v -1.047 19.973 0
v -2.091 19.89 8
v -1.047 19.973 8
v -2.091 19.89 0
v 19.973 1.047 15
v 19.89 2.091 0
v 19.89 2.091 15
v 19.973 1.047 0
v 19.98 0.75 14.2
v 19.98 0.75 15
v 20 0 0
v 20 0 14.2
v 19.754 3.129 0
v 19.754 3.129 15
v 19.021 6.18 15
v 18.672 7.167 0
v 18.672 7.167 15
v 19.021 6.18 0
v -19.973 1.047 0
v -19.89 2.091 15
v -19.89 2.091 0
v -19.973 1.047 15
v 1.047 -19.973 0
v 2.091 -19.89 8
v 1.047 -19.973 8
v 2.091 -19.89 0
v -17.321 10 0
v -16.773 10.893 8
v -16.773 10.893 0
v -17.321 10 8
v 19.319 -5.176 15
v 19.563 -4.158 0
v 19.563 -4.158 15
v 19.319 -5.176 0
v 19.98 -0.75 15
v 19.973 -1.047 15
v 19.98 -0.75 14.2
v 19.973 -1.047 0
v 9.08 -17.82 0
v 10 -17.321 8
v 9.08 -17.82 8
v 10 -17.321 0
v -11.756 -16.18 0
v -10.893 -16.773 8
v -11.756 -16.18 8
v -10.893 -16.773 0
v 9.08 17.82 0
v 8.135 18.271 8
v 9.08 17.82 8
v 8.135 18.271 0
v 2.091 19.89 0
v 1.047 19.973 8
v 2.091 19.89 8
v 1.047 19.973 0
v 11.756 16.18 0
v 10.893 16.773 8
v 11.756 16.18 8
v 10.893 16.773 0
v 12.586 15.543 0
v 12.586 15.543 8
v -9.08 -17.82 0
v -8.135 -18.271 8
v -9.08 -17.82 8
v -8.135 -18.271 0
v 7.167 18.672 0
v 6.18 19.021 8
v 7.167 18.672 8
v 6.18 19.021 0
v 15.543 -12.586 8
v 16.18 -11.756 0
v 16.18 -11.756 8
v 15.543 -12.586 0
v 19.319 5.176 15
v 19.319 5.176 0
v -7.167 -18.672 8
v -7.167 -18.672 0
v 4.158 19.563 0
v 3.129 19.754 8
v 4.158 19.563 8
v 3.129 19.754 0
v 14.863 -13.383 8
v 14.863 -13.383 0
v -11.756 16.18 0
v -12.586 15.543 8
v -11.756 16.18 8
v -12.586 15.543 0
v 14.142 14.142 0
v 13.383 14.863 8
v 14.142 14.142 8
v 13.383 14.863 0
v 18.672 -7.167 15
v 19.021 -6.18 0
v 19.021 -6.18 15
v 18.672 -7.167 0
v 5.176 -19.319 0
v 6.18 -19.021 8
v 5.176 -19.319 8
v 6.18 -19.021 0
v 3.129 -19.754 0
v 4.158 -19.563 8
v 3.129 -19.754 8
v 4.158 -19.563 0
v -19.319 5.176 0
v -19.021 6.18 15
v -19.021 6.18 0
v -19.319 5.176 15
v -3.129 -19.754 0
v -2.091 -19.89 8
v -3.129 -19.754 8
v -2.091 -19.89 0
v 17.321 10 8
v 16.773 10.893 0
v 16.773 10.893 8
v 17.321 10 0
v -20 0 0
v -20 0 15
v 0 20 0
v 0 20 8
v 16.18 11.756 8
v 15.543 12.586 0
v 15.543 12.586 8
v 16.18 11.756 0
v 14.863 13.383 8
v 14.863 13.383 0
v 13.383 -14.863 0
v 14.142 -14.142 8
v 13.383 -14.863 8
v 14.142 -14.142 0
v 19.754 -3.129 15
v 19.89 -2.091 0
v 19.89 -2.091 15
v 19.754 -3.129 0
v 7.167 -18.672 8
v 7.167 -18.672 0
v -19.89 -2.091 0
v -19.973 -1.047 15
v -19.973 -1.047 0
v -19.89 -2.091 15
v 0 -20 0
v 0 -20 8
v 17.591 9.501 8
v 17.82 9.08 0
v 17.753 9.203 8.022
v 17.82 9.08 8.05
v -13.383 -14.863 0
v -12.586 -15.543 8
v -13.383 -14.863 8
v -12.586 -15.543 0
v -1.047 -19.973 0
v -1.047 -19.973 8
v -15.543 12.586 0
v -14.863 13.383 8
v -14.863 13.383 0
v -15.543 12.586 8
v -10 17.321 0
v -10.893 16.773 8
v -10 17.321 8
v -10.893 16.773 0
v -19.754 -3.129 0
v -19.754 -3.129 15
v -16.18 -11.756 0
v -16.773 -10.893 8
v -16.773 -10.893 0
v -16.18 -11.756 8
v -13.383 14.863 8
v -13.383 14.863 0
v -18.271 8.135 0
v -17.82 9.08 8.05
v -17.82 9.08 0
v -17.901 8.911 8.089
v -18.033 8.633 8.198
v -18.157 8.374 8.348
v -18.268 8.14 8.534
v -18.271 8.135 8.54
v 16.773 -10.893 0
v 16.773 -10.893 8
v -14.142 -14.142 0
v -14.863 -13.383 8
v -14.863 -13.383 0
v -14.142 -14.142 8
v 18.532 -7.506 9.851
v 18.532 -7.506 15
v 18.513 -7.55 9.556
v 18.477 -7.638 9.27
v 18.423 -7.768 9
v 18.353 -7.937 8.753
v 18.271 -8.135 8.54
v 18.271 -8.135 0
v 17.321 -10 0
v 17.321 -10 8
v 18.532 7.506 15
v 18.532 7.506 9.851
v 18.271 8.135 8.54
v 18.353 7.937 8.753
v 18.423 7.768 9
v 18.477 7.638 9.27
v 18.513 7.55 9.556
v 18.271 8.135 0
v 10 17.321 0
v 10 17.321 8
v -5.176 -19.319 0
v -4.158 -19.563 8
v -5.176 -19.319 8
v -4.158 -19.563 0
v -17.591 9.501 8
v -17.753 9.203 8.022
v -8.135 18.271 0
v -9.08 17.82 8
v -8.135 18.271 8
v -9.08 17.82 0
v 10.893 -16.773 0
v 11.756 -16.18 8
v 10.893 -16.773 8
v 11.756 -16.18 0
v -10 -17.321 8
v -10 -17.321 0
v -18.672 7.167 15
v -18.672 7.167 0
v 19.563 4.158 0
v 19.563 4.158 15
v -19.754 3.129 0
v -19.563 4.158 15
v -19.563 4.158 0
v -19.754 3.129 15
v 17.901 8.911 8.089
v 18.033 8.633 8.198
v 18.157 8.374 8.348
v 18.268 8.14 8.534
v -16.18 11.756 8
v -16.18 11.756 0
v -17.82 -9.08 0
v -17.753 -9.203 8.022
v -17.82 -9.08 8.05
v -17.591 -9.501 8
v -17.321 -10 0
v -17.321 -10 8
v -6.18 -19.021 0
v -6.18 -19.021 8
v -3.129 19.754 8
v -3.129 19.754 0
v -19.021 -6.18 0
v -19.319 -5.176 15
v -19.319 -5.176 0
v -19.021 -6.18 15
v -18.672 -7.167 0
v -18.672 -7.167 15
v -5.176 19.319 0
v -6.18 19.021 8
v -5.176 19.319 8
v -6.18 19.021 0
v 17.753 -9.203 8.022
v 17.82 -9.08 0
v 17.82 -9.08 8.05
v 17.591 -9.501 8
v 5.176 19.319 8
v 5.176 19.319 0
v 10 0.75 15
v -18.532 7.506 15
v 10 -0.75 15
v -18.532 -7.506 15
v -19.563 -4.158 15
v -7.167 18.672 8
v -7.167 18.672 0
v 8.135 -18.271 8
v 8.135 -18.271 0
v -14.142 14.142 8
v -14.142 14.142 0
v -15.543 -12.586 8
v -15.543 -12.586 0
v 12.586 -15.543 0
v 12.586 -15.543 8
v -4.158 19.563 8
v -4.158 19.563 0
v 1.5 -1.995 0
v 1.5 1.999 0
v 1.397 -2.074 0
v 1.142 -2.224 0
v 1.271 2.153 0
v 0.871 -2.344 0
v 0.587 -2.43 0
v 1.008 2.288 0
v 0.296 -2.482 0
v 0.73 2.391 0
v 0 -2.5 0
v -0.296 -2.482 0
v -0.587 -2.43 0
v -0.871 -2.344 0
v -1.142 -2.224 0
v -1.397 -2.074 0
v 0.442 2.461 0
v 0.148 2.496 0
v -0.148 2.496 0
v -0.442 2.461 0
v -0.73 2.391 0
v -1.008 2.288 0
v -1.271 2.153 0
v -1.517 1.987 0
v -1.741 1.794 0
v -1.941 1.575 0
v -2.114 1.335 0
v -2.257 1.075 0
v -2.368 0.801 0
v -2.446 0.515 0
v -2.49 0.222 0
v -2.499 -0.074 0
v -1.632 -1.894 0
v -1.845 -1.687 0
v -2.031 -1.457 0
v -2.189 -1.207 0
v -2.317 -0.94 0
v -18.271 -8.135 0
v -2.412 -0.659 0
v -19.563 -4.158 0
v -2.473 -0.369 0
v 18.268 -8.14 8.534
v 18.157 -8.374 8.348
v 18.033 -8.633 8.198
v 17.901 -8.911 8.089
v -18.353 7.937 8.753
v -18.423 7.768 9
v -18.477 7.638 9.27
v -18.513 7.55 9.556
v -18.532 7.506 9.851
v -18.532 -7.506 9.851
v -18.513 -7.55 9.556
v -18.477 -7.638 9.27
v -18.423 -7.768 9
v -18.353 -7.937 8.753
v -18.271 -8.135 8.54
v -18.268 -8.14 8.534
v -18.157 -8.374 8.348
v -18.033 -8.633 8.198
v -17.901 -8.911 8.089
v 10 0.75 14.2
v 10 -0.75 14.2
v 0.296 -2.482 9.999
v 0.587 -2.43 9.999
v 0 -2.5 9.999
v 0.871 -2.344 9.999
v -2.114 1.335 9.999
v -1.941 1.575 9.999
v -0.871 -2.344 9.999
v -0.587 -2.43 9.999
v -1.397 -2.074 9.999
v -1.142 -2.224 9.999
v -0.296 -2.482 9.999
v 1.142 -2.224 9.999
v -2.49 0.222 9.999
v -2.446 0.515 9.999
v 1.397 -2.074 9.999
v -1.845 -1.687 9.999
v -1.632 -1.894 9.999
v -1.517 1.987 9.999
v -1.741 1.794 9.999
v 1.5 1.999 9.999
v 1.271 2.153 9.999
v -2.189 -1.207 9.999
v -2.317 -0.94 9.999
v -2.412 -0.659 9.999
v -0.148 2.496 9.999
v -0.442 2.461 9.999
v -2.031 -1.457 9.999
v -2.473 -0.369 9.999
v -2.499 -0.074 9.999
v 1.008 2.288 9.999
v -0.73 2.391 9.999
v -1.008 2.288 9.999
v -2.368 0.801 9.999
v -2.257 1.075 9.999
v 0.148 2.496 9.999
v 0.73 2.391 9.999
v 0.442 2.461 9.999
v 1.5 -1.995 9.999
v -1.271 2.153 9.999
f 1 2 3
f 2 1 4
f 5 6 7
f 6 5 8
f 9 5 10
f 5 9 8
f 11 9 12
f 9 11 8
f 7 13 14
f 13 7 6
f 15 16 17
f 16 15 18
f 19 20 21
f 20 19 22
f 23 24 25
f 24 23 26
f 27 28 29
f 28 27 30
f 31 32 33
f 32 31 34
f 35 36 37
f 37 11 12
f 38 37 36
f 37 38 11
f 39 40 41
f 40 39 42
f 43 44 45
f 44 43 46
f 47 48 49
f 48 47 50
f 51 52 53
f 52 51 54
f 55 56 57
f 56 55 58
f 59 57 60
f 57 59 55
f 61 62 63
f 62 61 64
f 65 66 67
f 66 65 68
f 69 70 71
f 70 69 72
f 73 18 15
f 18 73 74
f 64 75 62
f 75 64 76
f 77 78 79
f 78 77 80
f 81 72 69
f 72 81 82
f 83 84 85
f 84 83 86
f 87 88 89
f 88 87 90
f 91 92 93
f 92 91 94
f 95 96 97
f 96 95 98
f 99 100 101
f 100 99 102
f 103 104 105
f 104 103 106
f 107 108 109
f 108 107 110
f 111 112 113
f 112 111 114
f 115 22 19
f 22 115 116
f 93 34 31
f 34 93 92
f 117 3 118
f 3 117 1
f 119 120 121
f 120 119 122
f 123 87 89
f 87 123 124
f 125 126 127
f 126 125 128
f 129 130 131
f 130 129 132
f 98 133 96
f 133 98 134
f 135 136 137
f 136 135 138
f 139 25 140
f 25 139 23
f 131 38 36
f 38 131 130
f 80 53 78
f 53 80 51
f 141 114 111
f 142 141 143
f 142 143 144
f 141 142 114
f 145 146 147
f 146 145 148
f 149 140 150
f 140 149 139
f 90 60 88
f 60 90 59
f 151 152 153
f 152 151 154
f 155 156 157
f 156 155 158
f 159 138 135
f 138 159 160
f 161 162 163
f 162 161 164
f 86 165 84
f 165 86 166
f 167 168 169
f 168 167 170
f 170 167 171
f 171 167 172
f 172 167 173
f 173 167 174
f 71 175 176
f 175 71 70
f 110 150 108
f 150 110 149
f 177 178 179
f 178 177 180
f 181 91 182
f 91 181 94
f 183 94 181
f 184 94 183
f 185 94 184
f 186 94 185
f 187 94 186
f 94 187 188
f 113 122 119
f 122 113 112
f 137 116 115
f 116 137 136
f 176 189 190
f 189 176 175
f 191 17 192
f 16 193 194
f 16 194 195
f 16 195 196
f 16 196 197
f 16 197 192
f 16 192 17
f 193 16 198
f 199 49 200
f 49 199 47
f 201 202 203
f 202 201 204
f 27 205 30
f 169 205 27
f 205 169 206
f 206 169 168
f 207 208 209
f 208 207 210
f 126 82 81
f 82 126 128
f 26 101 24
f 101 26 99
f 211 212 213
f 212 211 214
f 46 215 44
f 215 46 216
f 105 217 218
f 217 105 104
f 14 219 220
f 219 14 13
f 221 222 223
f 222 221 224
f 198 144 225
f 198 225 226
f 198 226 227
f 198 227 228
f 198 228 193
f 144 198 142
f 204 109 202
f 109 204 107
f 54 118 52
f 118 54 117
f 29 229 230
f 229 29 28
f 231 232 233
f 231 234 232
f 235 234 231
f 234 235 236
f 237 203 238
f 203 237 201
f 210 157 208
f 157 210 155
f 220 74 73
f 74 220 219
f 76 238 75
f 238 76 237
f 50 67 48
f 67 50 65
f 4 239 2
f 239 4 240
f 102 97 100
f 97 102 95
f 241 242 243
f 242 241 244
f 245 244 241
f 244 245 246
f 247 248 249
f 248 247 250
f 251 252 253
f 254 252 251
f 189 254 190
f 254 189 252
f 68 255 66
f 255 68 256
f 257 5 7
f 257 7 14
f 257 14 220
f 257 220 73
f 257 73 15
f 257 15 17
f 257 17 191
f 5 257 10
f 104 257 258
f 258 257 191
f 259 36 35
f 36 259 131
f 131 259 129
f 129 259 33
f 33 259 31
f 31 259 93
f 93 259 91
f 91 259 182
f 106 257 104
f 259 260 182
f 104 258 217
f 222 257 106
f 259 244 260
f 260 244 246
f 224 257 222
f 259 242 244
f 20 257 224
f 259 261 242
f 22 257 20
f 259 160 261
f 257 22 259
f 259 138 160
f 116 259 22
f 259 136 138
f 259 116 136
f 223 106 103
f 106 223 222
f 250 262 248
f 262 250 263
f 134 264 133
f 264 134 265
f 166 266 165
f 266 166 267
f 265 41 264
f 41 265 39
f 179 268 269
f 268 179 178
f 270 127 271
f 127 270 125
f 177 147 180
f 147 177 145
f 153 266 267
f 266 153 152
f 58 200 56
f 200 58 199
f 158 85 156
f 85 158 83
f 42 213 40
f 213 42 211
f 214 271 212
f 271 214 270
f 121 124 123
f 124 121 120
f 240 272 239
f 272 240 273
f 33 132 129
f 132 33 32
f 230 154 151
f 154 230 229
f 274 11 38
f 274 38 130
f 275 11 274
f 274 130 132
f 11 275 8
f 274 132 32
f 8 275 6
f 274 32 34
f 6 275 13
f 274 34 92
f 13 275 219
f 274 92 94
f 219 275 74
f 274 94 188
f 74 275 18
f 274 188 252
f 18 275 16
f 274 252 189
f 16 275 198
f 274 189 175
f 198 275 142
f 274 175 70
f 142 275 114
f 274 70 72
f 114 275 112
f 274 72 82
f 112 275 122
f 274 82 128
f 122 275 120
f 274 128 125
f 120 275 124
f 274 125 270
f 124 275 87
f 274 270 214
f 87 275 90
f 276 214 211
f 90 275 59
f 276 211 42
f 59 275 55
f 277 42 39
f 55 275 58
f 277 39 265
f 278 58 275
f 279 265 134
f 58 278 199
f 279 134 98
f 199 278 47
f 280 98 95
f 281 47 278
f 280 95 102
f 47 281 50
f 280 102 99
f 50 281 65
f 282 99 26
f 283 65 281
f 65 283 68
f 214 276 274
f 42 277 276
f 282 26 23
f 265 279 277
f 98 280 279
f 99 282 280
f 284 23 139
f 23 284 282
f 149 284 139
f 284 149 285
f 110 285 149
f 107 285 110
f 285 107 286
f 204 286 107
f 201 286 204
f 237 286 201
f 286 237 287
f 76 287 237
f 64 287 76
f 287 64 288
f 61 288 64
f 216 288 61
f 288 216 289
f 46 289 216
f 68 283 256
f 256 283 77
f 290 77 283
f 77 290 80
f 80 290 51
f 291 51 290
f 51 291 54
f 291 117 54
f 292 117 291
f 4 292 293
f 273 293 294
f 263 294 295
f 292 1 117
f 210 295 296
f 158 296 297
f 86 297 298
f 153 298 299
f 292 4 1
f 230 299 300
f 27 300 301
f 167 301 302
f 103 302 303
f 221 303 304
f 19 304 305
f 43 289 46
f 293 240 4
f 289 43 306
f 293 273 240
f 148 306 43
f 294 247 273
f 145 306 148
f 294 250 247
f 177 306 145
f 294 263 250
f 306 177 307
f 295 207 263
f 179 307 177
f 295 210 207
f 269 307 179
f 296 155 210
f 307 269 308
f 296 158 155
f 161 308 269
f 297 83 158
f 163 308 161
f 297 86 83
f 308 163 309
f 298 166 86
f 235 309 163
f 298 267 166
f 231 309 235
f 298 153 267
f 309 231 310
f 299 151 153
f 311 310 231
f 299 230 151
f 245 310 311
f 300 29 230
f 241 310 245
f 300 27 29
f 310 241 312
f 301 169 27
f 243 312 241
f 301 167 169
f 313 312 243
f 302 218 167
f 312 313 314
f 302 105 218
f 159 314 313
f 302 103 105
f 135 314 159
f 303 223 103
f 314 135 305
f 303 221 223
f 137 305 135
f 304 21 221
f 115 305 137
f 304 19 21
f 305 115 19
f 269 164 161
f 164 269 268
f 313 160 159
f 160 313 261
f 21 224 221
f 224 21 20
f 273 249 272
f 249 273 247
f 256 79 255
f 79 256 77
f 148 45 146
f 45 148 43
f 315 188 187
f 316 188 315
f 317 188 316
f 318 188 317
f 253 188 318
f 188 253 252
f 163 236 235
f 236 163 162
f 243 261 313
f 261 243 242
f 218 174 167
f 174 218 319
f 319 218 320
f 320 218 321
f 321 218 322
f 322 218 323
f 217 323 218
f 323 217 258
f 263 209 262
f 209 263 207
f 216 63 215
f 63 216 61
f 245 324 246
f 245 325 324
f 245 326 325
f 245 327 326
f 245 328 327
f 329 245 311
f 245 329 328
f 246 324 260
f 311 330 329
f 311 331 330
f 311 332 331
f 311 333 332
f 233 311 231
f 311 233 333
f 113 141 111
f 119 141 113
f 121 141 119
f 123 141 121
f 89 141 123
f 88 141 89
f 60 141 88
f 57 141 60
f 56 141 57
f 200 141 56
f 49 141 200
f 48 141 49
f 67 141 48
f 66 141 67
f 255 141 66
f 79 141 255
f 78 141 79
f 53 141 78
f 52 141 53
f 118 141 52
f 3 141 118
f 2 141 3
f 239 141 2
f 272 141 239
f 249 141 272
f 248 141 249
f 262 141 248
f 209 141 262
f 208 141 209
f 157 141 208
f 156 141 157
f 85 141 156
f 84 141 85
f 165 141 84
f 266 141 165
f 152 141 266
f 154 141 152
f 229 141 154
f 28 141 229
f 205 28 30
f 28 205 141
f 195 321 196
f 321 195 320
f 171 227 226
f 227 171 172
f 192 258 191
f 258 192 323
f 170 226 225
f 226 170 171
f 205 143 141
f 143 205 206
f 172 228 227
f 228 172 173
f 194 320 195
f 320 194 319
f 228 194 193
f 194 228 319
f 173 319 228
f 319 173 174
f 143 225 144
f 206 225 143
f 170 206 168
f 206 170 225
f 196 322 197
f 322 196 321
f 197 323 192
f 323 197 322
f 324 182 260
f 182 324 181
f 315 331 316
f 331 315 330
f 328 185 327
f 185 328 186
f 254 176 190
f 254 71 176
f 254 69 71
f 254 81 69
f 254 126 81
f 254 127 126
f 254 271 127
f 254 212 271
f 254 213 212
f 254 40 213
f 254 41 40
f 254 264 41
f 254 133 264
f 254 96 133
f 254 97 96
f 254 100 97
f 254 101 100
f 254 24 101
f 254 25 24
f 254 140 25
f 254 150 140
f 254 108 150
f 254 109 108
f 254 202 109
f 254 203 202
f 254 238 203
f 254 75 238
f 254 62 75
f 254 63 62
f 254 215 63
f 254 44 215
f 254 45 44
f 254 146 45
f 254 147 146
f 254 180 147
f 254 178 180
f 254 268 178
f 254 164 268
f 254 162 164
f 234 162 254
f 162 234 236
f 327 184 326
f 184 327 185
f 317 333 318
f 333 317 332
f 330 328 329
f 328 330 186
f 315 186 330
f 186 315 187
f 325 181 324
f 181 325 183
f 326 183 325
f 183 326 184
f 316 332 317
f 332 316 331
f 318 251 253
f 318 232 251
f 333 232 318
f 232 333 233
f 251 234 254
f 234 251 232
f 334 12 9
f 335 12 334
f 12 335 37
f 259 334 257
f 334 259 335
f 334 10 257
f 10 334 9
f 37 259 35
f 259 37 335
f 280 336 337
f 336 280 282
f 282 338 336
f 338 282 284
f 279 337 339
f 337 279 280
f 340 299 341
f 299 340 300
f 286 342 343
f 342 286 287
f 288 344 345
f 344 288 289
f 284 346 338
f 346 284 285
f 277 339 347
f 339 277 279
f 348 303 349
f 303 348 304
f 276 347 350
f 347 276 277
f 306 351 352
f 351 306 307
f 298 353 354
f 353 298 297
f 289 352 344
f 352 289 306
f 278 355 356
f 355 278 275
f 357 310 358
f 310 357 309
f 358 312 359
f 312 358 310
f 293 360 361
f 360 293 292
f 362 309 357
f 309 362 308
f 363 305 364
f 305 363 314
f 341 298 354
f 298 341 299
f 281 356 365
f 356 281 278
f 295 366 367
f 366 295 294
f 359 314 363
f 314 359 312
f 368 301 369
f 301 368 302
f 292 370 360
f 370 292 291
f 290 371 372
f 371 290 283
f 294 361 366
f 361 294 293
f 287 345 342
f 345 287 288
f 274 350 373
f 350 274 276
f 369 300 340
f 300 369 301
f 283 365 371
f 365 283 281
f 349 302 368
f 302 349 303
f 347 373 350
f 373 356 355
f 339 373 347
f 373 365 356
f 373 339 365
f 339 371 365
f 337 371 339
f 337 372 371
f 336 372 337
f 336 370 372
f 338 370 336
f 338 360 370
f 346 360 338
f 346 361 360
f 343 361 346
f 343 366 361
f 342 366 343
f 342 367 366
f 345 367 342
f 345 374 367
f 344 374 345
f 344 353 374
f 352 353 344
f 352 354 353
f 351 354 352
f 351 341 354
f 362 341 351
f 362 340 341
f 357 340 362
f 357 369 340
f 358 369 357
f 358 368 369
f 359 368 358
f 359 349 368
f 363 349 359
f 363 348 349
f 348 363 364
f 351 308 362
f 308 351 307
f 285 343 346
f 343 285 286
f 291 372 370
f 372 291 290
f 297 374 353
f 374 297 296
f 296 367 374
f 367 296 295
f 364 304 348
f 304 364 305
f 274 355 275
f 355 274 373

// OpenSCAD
/*
    OpenSCAD Script Name: D-shaft knob generator
    Author: Frantisek Nagy - hello@nagy.sh
    Date: 2025-02-23
    License: CC BY-NC-SA 4.0

    Copyright (c) 2025 Frantisek Nagy
*/

// https://makerworld.com/en/models/1142338-d-shaft-knob-generator

/* [Knob] */
Diameter=40;
Full_height=15;
Head_height=7;
Head_width=15;
Head_fillet=2;
/* [Marker line] */
Line_width=1.5;
Line_height=10;
Line_depth=0.8;
/* [Shaft] */
// Shaft Diameter ⌀
Shaft_Diameter = 5.0;
// Diameter (across cut) >D<
D_Shaft_Diameter = 4.0;
Shaft_depth=10;
Shaft_rotation=0; //[0:90:270]
/* [Bottom] */

Bottom_type="Full"; // [Full, Inner, Outer]
Inner_diameter=15;
Wall_width=3;
Wall=Diameter-Wall_width;
Outher_Length = 10;
Outer_diameter = 13;
/* [Hidden] */
$fs=.3;
/* [Hidden] */
$fa=3;
Fillet_radius=Head_fillet+0.001;

module Knob(){
    difference(){
    cylinder(h=Full_height, d=Diameter);

        translate([-Diameter/2,Fillet_radius+Head_width/2,Diameter+Fillet_radius+Full_height-Head_height])
       rotate([0,90,0])minkowski()
            {
              cube([Diameter,Diameter,1]);
              cylinder(r=Fillet_radius,h=Diameter);
            }

        translate([-Diameter/2,-Fillet_radius-Head_width/2-Diameter,Diameter+Fillet_radius+Full_height-Head_height])
       rotate([0,90,0])minkowski()
            {
              cube([Diameter,Diameter,1]);
              cylinder(r=Fillet_radius,h=Diameter);
            }
            translate([Diameter/2,0,Full_height])
    cube([Line_height*2,Line_width,Line_depth*2], center=true);
    if (Bottom_type=="Inner") Hollow();
    }
}
module Hollow(){
    translate([0, 0, -0.001])difference() {
    if (Wall_width<=1) 
        cylinder(h = Full_height-Head_height-1, d = Diameter-1);
    else
        cylinder(h = Full_height-Head_height-Wall_width, d = Wall);
        
    translate([0, 0, 0])
        if (Inner_diameter<=Shaft_Diameter) 
            cylinder(h = Full_height, d = Shaft_Diameter+1);
        else
            cylinder(h = Full_height, d = Inner_diameter);
    }
}

module Shaft(){
        translate([0, 0, -0.001])rotate([0,0,270])difference(){
        cylinder(h=Shaft_depth, d=Shaft_Diameter);
        translate([0,D_Shaft_Diameter,(Shaft_depth/2)])
        cube([Shaft_Diameter,Shaft_Diameter,Shaft_depth], center=true);
    }
}
if (Bottom_type=="Outer"){
  difference(){
  union(){
    Knob();
    translate([0,0,0-Outher_Length])cylinder(h = Outher_Length, d = Outer_diameter);
    }
  rotate([0,0,Shaft_rotation])translate([0,0,0-Outher_Length])Shaft();
  }
}

if (Bottom_type!="Outer"){
    difference(){
        Knob();
        rotate([0,0,Shaft_rotation])
        Shaft();
    }
}
